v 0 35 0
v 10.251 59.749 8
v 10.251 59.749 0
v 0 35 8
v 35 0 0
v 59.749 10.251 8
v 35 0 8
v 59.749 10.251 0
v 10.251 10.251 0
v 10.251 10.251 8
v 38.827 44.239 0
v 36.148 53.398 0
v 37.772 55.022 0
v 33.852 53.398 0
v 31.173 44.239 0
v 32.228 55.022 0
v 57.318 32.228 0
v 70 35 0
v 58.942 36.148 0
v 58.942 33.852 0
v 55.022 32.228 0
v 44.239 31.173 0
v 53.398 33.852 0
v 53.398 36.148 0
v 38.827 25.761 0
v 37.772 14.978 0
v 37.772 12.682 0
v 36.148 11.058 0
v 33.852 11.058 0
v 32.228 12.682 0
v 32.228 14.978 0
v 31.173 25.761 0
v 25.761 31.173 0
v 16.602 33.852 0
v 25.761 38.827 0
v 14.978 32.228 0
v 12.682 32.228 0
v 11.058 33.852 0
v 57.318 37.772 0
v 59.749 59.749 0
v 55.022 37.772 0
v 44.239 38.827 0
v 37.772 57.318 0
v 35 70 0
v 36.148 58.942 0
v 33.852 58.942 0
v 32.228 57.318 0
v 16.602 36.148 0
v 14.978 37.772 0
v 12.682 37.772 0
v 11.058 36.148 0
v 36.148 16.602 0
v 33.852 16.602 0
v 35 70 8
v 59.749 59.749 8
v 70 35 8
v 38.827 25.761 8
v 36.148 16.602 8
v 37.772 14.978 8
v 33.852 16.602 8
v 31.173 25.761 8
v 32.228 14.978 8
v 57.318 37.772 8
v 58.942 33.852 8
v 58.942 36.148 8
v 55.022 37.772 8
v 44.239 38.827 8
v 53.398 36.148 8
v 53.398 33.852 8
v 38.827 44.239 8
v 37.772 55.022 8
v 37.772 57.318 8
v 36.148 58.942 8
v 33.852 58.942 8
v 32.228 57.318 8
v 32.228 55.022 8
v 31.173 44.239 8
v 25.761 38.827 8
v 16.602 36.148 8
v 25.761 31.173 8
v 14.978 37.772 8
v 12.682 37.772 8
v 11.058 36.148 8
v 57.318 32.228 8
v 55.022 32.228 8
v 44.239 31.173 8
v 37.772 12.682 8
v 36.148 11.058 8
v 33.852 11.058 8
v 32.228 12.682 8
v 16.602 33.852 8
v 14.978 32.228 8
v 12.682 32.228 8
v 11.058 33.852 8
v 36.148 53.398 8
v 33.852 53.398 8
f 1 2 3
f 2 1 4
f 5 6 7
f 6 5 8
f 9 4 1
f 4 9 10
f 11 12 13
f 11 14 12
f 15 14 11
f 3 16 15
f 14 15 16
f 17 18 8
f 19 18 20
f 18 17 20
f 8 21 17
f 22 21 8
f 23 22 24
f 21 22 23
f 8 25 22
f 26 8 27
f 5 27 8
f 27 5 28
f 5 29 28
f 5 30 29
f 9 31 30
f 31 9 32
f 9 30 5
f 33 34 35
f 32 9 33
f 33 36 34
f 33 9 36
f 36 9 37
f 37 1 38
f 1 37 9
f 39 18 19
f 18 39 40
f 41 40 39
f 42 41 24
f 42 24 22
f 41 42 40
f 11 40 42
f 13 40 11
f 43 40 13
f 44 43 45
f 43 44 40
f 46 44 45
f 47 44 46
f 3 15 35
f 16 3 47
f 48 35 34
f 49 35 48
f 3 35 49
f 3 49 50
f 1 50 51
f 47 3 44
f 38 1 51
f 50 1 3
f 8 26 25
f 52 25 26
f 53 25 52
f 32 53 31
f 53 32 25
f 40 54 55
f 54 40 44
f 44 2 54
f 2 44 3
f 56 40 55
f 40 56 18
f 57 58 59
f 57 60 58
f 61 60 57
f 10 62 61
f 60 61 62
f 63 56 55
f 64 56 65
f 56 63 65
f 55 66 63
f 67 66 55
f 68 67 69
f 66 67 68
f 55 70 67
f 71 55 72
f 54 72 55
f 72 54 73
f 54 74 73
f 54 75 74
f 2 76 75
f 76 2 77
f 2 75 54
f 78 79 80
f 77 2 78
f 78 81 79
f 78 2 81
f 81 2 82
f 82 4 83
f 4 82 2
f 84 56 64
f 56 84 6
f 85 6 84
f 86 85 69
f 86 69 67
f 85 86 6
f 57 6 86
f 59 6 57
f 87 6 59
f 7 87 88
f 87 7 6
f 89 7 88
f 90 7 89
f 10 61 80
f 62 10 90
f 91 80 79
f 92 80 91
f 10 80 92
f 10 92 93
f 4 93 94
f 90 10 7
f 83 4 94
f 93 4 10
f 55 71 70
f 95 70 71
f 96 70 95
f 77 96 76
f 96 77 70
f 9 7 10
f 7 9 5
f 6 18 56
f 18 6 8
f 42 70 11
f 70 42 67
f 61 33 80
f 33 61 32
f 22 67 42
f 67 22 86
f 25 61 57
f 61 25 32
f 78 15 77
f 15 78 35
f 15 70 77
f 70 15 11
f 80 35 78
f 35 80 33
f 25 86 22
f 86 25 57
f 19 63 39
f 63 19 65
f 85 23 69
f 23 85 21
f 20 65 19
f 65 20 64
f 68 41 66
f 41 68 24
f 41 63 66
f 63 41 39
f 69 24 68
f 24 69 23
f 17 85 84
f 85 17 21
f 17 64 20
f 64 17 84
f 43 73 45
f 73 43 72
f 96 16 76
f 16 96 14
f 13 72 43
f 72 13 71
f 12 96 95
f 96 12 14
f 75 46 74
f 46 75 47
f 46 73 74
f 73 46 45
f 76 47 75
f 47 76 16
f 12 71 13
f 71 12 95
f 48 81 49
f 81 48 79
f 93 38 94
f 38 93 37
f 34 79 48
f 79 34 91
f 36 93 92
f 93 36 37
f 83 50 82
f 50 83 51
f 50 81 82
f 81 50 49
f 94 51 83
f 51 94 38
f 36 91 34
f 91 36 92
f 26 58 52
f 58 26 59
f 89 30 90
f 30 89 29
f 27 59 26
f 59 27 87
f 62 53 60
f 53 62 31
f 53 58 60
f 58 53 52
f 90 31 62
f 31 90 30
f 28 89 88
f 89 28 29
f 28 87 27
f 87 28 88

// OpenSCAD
$fn = 32;

// ----------------------------------------------------------------------
// Polygon plate: 8-gon R35, 4 bolt windows
// ----------------------------------------------------------------------

// --- parameters (mm) ---
sides = 8;                // number of polygon sides
plate_r = 35;             // circumscribed radius of the polygon
bore_r = 10;              // centre bore radius
bolts = 4;                // number of bolt windows
ring_r = 21.17;           // bolt-circle radius
bolt_r = 3;               // bolt window radius
plate_t = 8;              // plate thickness, Z (extrusion height)
fit_tol = 0.05;           // declared fit tolerance (prompt contract)
free_tol = 0.2;           // declared free tolerance (prompt contract)

plate_d = 2 * plate_r;  // circumscribed diameter
bore_d = 2 * bore_r;  // centre bore diameter
bolt_d = 2 * bolt_r;  // bolt window diameter
ring_d = 2 * ring_r;  // bolt-circle diameter

profile = [[70, 35], [59.749, 59.749], [35, 70], [10.251, 59.749], [0, 35], [10.251, 10.251], [35, 0], [59.749, 10.251]];  // primary outline, 8 points, counter clockwise
void_1 = [[44.239, 38.827], [38.827, 44.239], [31.173, 44.239], [25.761, 38.827], [25.761, 31.173], [31.173, 25.761], [38.827, 25.761], [44.239, 31.173]];  // centre bore, 8 points
void_2 = [[58.942, 36.148], [57.318, 37.772], [55.022, 37.772], [53.398, 36.148], [53.398, 33.852], [55.022, 32.228], [57.318, 32.228], [58.942, 33.852]];  // bolt window 1, 8 points
void_3 = [[37.772, 57.318], [36.148, 58.942], [33.852, 58.942], [32.228, 57.318], [32.228, 55.022], [33.852, 53.398], [36.148, 53.398], [37.772, 55.022]];  // bolt window 2, 8 points
void_4 = [[16.602, 36.148], [14.978, 37.772], [12.682, 37.772], [11.058, 36.148], [11.058, 33.852], [12.682, 32.228], [14.978, 32.228], [16.602, 33.852]];  // bolt window 3, 8 points
void_5 = [[37.772, 14.978], [36.148, 16.602], [33.852, 16.602], [32.228, 14.978], [32.228, 12.682], [33.852, 11.058], [36.148, 11.058], [37.772, 12.682]];  // bolt window 4, 8 points

// --- the one profile operation ---
difference() {
  linear_extrude(height = plate_t) polygon(points = profile);
  translate([0, 0, -1])
    linear_extrude(height = plate_t + 2) polygon(points = void_1);
  translate([0, 0, -1])
    linear_extrude(height = plate_t + 2) polygon(points = void_2);
  translate([0, 0, -1])
    linear_extrude(height = plate_t + 2) polygon(points = void_3);
  translate([0, 0, -1])
    linear_extrude(height = plate_t + 2) polygon(points = void_4);
  translate([0, 0, -1])
    linear_extrude(height = plate_t + 2) polygon(points = void_5);
}
